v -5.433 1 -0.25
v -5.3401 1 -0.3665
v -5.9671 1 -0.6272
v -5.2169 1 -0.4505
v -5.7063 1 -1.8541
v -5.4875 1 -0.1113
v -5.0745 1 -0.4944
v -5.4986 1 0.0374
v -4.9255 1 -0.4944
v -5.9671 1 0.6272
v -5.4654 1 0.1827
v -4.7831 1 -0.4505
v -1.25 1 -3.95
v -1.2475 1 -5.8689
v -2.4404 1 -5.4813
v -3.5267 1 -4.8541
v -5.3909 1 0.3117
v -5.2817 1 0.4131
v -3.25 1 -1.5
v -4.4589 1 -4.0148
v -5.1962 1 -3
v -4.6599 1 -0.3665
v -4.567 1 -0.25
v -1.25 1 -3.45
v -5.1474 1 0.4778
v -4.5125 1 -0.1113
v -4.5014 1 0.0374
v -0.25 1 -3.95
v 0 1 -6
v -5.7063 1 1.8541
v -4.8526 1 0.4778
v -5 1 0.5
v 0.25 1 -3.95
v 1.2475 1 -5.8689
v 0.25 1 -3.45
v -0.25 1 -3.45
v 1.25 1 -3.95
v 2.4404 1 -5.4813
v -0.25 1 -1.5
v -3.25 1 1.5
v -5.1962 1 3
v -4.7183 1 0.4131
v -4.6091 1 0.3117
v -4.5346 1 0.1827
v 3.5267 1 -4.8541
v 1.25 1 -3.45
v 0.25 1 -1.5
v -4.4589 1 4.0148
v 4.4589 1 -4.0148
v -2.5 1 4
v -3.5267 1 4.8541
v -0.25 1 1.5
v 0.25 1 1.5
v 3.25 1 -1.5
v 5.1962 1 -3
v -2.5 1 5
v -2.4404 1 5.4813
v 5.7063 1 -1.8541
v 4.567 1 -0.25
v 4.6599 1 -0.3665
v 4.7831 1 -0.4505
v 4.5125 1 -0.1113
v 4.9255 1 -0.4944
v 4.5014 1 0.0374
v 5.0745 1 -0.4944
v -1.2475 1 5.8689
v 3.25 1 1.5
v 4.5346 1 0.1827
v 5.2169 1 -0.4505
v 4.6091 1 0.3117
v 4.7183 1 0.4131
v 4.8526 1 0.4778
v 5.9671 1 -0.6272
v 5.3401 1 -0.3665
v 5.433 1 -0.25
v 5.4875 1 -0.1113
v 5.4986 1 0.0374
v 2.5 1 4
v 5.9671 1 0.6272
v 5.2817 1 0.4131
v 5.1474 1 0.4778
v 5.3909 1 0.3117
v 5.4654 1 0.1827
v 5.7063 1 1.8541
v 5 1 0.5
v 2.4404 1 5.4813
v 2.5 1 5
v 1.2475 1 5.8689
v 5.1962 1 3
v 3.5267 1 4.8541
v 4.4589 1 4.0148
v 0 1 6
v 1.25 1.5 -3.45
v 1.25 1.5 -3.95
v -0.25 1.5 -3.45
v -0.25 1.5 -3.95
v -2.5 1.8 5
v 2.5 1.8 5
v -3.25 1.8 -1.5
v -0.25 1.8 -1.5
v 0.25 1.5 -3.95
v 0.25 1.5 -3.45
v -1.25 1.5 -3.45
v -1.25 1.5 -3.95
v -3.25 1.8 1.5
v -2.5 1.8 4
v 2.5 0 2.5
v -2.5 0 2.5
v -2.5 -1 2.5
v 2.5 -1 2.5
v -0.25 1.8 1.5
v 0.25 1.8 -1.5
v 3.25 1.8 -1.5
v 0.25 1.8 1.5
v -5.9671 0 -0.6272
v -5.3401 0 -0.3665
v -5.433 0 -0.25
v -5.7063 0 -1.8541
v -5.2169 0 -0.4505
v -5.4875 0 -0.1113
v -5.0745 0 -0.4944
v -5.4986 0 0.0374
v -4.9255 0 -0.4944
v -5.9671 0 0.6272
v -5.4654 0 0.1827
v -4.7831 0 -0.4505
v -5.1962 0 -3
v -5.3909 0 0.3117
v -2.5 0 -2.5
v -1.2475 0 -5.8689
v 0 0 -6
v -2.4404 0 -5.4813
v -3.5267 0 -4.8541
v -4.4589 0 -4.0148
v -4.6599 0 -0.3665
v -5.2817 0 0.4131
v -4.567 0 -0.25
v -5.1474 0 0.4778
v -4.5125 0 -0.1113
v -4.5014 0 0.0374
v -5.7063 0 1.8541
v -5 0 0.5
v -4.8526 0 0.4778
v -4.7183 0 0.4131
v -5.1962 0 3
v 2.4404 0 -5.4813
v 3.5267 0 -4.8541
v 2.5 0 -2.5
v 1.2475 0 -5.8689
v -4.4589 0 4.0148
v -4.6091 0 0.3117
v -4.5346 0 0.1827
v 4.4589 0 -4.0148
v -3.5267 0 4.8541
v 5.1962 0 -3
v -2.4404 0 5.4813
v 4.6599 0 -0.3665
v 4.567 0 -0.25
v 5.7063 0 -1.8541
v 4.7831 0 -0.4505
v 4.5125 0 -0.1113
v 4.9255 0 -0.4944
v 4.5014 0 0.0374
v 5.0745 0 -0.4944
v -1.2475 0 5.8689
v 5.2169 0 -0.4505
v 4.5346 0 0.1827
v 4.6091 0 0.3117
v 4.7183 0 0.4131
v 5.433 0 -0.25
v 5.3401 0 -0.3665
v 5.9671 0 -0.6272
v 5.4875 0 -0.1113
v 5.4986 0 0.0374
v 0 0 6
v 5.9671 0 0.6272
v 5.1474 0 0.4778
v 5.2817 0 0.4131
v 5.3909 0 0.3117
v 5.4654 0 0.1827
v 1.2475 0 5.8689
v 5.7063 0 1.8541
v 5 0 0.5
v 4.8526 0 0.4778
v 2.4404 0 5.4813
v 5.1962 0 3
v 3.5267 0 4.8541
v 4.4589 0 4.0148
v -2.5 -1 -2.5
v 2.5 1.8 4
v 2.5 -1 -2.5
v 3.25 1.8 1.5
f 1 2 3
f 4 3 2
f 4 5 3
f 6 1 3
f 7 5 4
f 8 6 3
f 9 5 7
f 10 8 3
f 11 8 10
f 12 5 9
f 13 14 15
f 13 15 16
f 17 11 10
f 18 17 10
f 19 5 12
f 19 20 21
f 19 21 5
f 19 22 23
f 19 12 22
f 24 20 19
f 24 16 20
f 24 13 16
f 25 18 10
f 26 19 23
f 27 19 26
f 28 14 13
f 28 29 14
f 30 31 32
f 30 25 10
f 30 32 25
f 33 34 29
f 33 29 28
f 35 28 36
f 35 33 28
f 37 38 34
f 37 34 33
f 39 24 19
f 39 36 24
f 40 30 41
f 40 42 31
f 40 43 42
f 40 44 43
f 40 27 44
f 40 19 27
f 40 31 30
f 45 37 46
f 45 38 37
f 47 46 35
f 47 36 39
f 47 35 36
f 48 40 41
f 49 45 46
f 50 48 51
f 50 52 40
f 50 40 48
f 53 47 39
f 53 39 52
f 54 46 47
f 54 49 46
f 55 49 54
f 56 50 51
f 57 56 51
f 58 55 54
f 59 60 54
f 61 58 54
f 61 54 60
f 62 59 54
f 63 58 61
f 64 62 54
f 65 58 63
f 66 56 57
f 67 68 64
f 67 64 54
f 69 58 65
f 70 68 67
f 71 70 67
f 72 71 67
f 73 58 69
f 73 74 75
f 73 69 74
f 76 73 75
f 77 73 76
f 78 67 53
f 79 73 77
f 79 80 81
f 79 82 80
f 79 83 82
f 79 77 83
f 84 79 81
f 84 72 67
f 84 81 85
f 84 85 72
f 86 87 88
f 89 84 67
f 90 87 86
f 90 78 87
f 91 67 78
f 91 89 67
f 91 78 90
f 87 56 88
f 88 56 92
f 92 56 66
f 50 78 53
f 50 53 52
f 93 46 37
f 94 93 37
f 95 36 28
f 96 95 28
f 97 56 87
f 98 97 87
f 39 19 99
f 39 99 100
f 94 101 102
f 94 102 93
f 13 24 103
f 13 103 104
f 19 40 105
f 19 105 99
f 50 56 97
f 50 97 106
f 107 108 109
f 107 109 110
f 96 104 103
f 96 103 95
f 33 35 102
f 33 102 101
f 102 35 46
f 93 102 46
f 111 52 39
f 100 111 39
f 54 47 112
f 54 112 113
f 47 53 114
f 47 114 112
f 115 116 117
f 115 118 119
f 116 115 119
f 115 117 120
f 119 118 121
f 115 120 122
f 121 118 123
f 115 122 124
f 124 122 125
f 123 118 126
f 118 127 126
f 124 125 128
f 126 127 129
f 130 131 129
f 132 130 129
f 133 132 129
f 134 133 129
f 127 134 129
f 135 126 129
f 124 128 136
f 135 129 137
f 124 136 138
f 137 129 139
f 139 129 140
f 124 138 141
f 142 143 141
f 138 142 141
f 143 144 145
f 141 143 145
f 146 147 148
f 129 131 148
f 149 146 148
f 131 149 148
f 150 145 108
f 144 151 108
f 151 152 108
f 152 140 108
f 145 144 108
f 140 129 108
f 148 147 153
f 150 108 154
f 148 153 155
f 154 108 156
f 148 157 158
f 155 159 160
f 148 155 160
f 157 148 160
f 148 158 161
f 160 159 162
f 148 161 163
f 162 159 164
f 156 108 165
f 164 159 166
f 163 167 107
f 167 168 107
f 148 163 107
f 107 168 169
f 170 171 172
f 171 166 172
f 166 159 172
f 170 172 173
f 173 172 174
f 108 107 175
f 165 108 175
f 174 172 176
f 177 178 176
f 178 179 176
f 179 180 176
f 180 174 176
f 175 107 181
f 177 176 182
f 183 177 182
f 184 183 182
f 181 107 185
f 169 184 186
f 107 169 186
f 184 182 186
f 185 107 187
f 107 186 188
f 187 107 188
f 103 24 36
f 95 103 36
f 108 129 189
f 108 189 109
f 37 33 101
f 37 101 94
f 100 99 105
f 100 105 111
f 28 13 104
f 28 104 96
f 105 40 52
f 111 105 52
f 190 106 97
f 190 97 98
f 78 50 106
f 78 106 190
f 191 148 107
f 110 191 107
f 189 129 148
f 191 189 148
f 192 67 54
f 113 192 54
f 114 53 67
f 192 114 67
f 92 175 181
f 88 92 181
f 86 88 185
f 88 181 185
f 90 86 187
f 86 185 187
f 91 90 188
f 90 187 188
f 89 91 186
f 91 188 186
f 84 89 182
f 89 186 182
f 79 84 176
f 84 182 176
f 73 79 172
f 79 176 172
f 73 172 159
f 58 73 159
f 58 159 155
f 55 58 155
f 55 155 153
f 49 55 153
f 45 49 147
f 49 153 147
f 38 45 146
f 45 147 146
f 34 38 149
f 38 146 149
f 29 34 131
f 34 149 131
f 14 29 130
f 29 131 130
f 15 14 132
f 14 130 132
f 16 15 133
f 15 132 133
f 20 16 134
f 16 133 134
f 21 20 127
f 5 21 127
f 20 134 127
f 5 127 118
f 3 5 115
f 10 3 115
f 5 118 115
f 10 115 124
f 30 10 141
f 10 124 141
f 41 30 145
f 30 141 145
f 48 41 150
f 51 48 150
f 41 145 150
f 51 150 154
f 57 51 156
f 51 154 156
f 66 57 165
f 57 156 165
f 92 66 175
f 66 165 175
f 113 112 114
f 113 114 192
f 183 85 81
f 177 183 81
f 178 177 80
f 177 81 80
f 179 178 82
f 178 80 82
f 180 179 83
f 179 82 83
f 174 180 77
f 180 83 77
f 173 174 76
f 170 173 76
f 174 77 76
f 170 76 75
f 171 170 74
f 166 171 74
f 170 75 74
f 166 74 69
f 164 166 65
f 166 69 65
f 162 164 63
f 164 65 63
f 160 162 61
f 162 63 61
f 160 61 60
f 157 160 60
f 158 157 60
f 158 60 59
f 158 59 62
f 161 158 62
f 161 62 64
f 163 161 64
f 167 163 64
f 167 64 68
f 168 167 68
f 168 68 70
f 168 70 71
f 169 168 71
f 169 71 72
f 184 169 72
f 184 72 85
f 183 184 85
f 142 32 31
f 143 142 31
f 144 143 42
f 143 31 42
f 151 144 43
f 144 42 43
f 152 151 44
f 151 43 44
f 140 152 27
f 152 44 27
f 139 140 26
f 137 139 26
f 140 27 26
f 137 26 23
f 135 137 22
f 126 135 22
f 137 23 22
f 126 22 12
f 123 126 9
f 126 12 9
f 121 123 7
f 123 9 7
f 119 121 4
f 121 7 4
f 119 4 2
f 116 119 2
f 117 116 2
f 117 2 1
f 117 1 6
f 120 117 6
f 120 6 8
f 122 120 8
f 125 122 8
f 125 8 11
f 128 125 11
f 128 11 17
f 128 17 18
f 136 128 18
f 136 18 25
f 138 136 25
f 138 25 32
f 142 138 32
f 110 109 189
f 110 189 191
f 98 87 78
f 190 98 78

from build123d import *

# Parameters (mm, degrees)
SKETCH_1_R          = 6
EXTRUDE_1_DEPTH     = 1
SKETCH_2_W          = 3
SKETCH_2_H          = 3
SKETCH_2_W_2        = 5
SKETCH_2_H_2        = 1
EXTRUDE_2_DEPTH     = 0.8
SKETCH_2_6_W        = 1
SKETCH_2_6_H        = 0.5
EXTRUDE_3_DEPTH     = 0.5
SKETCH_4_W          = 5
SKETCH_4_H          = 5
EXTRUDE_4_DEPTH     = 1
CUT_EXTRUDE_1_REACH = 10.718
SKETCH_5_R          = 0.5


with BuildPart() as part:
    # 草图1 → 凸台-拉伸1 (new body)
    with BuildSketch(Plane(origin=(0, 0, 0), x_dir=(1, 0, 0), z_dir=(0, 1, 0))):
        Circle(SKETCH_1_R)
    extrude(amount=EXTRUDE_1_DEPTH)

    # 草图2 → 凸台-拉伸2 (add)
    with BuildSketch(Plane(origin=(0, 1, 0), x_dir=(1, 0, 0), z_dir=(0, 1, 0))):
        with Locations((1.75, 0)):
            Rectangle(SKETCH_2_W, SKETCH_2_H)
        with Locations((-1.75, 0)):
            Rectangle(SKETCH_2_W, SKETCH_2_H)
        with Locations((0, -4.5)):
            Rectangle(SKETCH_2_W_2, SKETCH_2_H_2)
    extrude(amount=EXTRUDE_2_DEPTH)

    # 草图2<6> → 凸台-拉伸3 (add)
    with BuildSketch(Plane(origin=(0, 1, 0), x_dir=(1, 0, 0), z_dir=(0, 1, 0))):
        with Locations((0.75, 3.7)):
            Rectangle(SKETCH_2_6_W, SKETCH_2_6_H)
        with Locations((-0.75, 3.7)):
            Rectangle(SKETCH_2_6_W, SKETCH_2_6_H)
    extrude(amount=EXTRUDE_3_DEPTH)

    # 草图4 → 凸台-拉伸4 (add)
    with BuildSketch(Plane.XZ):
        Rectangle(SKETCH_4_W, SKETCH_4_H)
    extrude(amount=EXTRUDE_4_DEPTH)

    # 草图5 → 切除-拉伸1 (cut, up to next)
    with BuildSketch(Plane(origin=(0, 1, 0), x_dir=(1, 0, 0), z_dir=(0, 1, 0)), mode=Mode.PRIVATE) as cut_extrude_1_sk1:
        with Locations((5, 0)):
            Circle(SKETCH_5_R)
    cut_extrude_1_tool1 = extrude(cut_extrude_1_sk1.sketch, amount=-CUT_EXTRUDE_1_REACH, mode=Mode.PRIVATE) & part.part
    # 草图5 → 切除-拉伸1 (cut, up to next)
    with BuildSketch(Plane(origin=(0, 1, 0), x_dir=(1, 0, 0), z_dir=(0, 1, 0)), mode=Mode.PRIVATE) as cut_extrude_1_sk2:
        with Locations((-5, 0)):
            Circle(SKETCH_5_R)
    cut_extrude_1_tool2 = extrude(cut_extrude_1_sk2.sketch, amount=-CUT_EXTRUDE_1_REACH, mode=Mode.PRIVATE) & part.part
    add(cut_extrude_1_tool1.solids().sort_by_distance((5, 1, 0))[0], mode=Mode.SUBTRACT)
    add(cut_extrude_1_tool2.solids().sort_by_distance((-5, 1, 0))[0], mode=Mode.SUBTRACT)


solid = part.part
